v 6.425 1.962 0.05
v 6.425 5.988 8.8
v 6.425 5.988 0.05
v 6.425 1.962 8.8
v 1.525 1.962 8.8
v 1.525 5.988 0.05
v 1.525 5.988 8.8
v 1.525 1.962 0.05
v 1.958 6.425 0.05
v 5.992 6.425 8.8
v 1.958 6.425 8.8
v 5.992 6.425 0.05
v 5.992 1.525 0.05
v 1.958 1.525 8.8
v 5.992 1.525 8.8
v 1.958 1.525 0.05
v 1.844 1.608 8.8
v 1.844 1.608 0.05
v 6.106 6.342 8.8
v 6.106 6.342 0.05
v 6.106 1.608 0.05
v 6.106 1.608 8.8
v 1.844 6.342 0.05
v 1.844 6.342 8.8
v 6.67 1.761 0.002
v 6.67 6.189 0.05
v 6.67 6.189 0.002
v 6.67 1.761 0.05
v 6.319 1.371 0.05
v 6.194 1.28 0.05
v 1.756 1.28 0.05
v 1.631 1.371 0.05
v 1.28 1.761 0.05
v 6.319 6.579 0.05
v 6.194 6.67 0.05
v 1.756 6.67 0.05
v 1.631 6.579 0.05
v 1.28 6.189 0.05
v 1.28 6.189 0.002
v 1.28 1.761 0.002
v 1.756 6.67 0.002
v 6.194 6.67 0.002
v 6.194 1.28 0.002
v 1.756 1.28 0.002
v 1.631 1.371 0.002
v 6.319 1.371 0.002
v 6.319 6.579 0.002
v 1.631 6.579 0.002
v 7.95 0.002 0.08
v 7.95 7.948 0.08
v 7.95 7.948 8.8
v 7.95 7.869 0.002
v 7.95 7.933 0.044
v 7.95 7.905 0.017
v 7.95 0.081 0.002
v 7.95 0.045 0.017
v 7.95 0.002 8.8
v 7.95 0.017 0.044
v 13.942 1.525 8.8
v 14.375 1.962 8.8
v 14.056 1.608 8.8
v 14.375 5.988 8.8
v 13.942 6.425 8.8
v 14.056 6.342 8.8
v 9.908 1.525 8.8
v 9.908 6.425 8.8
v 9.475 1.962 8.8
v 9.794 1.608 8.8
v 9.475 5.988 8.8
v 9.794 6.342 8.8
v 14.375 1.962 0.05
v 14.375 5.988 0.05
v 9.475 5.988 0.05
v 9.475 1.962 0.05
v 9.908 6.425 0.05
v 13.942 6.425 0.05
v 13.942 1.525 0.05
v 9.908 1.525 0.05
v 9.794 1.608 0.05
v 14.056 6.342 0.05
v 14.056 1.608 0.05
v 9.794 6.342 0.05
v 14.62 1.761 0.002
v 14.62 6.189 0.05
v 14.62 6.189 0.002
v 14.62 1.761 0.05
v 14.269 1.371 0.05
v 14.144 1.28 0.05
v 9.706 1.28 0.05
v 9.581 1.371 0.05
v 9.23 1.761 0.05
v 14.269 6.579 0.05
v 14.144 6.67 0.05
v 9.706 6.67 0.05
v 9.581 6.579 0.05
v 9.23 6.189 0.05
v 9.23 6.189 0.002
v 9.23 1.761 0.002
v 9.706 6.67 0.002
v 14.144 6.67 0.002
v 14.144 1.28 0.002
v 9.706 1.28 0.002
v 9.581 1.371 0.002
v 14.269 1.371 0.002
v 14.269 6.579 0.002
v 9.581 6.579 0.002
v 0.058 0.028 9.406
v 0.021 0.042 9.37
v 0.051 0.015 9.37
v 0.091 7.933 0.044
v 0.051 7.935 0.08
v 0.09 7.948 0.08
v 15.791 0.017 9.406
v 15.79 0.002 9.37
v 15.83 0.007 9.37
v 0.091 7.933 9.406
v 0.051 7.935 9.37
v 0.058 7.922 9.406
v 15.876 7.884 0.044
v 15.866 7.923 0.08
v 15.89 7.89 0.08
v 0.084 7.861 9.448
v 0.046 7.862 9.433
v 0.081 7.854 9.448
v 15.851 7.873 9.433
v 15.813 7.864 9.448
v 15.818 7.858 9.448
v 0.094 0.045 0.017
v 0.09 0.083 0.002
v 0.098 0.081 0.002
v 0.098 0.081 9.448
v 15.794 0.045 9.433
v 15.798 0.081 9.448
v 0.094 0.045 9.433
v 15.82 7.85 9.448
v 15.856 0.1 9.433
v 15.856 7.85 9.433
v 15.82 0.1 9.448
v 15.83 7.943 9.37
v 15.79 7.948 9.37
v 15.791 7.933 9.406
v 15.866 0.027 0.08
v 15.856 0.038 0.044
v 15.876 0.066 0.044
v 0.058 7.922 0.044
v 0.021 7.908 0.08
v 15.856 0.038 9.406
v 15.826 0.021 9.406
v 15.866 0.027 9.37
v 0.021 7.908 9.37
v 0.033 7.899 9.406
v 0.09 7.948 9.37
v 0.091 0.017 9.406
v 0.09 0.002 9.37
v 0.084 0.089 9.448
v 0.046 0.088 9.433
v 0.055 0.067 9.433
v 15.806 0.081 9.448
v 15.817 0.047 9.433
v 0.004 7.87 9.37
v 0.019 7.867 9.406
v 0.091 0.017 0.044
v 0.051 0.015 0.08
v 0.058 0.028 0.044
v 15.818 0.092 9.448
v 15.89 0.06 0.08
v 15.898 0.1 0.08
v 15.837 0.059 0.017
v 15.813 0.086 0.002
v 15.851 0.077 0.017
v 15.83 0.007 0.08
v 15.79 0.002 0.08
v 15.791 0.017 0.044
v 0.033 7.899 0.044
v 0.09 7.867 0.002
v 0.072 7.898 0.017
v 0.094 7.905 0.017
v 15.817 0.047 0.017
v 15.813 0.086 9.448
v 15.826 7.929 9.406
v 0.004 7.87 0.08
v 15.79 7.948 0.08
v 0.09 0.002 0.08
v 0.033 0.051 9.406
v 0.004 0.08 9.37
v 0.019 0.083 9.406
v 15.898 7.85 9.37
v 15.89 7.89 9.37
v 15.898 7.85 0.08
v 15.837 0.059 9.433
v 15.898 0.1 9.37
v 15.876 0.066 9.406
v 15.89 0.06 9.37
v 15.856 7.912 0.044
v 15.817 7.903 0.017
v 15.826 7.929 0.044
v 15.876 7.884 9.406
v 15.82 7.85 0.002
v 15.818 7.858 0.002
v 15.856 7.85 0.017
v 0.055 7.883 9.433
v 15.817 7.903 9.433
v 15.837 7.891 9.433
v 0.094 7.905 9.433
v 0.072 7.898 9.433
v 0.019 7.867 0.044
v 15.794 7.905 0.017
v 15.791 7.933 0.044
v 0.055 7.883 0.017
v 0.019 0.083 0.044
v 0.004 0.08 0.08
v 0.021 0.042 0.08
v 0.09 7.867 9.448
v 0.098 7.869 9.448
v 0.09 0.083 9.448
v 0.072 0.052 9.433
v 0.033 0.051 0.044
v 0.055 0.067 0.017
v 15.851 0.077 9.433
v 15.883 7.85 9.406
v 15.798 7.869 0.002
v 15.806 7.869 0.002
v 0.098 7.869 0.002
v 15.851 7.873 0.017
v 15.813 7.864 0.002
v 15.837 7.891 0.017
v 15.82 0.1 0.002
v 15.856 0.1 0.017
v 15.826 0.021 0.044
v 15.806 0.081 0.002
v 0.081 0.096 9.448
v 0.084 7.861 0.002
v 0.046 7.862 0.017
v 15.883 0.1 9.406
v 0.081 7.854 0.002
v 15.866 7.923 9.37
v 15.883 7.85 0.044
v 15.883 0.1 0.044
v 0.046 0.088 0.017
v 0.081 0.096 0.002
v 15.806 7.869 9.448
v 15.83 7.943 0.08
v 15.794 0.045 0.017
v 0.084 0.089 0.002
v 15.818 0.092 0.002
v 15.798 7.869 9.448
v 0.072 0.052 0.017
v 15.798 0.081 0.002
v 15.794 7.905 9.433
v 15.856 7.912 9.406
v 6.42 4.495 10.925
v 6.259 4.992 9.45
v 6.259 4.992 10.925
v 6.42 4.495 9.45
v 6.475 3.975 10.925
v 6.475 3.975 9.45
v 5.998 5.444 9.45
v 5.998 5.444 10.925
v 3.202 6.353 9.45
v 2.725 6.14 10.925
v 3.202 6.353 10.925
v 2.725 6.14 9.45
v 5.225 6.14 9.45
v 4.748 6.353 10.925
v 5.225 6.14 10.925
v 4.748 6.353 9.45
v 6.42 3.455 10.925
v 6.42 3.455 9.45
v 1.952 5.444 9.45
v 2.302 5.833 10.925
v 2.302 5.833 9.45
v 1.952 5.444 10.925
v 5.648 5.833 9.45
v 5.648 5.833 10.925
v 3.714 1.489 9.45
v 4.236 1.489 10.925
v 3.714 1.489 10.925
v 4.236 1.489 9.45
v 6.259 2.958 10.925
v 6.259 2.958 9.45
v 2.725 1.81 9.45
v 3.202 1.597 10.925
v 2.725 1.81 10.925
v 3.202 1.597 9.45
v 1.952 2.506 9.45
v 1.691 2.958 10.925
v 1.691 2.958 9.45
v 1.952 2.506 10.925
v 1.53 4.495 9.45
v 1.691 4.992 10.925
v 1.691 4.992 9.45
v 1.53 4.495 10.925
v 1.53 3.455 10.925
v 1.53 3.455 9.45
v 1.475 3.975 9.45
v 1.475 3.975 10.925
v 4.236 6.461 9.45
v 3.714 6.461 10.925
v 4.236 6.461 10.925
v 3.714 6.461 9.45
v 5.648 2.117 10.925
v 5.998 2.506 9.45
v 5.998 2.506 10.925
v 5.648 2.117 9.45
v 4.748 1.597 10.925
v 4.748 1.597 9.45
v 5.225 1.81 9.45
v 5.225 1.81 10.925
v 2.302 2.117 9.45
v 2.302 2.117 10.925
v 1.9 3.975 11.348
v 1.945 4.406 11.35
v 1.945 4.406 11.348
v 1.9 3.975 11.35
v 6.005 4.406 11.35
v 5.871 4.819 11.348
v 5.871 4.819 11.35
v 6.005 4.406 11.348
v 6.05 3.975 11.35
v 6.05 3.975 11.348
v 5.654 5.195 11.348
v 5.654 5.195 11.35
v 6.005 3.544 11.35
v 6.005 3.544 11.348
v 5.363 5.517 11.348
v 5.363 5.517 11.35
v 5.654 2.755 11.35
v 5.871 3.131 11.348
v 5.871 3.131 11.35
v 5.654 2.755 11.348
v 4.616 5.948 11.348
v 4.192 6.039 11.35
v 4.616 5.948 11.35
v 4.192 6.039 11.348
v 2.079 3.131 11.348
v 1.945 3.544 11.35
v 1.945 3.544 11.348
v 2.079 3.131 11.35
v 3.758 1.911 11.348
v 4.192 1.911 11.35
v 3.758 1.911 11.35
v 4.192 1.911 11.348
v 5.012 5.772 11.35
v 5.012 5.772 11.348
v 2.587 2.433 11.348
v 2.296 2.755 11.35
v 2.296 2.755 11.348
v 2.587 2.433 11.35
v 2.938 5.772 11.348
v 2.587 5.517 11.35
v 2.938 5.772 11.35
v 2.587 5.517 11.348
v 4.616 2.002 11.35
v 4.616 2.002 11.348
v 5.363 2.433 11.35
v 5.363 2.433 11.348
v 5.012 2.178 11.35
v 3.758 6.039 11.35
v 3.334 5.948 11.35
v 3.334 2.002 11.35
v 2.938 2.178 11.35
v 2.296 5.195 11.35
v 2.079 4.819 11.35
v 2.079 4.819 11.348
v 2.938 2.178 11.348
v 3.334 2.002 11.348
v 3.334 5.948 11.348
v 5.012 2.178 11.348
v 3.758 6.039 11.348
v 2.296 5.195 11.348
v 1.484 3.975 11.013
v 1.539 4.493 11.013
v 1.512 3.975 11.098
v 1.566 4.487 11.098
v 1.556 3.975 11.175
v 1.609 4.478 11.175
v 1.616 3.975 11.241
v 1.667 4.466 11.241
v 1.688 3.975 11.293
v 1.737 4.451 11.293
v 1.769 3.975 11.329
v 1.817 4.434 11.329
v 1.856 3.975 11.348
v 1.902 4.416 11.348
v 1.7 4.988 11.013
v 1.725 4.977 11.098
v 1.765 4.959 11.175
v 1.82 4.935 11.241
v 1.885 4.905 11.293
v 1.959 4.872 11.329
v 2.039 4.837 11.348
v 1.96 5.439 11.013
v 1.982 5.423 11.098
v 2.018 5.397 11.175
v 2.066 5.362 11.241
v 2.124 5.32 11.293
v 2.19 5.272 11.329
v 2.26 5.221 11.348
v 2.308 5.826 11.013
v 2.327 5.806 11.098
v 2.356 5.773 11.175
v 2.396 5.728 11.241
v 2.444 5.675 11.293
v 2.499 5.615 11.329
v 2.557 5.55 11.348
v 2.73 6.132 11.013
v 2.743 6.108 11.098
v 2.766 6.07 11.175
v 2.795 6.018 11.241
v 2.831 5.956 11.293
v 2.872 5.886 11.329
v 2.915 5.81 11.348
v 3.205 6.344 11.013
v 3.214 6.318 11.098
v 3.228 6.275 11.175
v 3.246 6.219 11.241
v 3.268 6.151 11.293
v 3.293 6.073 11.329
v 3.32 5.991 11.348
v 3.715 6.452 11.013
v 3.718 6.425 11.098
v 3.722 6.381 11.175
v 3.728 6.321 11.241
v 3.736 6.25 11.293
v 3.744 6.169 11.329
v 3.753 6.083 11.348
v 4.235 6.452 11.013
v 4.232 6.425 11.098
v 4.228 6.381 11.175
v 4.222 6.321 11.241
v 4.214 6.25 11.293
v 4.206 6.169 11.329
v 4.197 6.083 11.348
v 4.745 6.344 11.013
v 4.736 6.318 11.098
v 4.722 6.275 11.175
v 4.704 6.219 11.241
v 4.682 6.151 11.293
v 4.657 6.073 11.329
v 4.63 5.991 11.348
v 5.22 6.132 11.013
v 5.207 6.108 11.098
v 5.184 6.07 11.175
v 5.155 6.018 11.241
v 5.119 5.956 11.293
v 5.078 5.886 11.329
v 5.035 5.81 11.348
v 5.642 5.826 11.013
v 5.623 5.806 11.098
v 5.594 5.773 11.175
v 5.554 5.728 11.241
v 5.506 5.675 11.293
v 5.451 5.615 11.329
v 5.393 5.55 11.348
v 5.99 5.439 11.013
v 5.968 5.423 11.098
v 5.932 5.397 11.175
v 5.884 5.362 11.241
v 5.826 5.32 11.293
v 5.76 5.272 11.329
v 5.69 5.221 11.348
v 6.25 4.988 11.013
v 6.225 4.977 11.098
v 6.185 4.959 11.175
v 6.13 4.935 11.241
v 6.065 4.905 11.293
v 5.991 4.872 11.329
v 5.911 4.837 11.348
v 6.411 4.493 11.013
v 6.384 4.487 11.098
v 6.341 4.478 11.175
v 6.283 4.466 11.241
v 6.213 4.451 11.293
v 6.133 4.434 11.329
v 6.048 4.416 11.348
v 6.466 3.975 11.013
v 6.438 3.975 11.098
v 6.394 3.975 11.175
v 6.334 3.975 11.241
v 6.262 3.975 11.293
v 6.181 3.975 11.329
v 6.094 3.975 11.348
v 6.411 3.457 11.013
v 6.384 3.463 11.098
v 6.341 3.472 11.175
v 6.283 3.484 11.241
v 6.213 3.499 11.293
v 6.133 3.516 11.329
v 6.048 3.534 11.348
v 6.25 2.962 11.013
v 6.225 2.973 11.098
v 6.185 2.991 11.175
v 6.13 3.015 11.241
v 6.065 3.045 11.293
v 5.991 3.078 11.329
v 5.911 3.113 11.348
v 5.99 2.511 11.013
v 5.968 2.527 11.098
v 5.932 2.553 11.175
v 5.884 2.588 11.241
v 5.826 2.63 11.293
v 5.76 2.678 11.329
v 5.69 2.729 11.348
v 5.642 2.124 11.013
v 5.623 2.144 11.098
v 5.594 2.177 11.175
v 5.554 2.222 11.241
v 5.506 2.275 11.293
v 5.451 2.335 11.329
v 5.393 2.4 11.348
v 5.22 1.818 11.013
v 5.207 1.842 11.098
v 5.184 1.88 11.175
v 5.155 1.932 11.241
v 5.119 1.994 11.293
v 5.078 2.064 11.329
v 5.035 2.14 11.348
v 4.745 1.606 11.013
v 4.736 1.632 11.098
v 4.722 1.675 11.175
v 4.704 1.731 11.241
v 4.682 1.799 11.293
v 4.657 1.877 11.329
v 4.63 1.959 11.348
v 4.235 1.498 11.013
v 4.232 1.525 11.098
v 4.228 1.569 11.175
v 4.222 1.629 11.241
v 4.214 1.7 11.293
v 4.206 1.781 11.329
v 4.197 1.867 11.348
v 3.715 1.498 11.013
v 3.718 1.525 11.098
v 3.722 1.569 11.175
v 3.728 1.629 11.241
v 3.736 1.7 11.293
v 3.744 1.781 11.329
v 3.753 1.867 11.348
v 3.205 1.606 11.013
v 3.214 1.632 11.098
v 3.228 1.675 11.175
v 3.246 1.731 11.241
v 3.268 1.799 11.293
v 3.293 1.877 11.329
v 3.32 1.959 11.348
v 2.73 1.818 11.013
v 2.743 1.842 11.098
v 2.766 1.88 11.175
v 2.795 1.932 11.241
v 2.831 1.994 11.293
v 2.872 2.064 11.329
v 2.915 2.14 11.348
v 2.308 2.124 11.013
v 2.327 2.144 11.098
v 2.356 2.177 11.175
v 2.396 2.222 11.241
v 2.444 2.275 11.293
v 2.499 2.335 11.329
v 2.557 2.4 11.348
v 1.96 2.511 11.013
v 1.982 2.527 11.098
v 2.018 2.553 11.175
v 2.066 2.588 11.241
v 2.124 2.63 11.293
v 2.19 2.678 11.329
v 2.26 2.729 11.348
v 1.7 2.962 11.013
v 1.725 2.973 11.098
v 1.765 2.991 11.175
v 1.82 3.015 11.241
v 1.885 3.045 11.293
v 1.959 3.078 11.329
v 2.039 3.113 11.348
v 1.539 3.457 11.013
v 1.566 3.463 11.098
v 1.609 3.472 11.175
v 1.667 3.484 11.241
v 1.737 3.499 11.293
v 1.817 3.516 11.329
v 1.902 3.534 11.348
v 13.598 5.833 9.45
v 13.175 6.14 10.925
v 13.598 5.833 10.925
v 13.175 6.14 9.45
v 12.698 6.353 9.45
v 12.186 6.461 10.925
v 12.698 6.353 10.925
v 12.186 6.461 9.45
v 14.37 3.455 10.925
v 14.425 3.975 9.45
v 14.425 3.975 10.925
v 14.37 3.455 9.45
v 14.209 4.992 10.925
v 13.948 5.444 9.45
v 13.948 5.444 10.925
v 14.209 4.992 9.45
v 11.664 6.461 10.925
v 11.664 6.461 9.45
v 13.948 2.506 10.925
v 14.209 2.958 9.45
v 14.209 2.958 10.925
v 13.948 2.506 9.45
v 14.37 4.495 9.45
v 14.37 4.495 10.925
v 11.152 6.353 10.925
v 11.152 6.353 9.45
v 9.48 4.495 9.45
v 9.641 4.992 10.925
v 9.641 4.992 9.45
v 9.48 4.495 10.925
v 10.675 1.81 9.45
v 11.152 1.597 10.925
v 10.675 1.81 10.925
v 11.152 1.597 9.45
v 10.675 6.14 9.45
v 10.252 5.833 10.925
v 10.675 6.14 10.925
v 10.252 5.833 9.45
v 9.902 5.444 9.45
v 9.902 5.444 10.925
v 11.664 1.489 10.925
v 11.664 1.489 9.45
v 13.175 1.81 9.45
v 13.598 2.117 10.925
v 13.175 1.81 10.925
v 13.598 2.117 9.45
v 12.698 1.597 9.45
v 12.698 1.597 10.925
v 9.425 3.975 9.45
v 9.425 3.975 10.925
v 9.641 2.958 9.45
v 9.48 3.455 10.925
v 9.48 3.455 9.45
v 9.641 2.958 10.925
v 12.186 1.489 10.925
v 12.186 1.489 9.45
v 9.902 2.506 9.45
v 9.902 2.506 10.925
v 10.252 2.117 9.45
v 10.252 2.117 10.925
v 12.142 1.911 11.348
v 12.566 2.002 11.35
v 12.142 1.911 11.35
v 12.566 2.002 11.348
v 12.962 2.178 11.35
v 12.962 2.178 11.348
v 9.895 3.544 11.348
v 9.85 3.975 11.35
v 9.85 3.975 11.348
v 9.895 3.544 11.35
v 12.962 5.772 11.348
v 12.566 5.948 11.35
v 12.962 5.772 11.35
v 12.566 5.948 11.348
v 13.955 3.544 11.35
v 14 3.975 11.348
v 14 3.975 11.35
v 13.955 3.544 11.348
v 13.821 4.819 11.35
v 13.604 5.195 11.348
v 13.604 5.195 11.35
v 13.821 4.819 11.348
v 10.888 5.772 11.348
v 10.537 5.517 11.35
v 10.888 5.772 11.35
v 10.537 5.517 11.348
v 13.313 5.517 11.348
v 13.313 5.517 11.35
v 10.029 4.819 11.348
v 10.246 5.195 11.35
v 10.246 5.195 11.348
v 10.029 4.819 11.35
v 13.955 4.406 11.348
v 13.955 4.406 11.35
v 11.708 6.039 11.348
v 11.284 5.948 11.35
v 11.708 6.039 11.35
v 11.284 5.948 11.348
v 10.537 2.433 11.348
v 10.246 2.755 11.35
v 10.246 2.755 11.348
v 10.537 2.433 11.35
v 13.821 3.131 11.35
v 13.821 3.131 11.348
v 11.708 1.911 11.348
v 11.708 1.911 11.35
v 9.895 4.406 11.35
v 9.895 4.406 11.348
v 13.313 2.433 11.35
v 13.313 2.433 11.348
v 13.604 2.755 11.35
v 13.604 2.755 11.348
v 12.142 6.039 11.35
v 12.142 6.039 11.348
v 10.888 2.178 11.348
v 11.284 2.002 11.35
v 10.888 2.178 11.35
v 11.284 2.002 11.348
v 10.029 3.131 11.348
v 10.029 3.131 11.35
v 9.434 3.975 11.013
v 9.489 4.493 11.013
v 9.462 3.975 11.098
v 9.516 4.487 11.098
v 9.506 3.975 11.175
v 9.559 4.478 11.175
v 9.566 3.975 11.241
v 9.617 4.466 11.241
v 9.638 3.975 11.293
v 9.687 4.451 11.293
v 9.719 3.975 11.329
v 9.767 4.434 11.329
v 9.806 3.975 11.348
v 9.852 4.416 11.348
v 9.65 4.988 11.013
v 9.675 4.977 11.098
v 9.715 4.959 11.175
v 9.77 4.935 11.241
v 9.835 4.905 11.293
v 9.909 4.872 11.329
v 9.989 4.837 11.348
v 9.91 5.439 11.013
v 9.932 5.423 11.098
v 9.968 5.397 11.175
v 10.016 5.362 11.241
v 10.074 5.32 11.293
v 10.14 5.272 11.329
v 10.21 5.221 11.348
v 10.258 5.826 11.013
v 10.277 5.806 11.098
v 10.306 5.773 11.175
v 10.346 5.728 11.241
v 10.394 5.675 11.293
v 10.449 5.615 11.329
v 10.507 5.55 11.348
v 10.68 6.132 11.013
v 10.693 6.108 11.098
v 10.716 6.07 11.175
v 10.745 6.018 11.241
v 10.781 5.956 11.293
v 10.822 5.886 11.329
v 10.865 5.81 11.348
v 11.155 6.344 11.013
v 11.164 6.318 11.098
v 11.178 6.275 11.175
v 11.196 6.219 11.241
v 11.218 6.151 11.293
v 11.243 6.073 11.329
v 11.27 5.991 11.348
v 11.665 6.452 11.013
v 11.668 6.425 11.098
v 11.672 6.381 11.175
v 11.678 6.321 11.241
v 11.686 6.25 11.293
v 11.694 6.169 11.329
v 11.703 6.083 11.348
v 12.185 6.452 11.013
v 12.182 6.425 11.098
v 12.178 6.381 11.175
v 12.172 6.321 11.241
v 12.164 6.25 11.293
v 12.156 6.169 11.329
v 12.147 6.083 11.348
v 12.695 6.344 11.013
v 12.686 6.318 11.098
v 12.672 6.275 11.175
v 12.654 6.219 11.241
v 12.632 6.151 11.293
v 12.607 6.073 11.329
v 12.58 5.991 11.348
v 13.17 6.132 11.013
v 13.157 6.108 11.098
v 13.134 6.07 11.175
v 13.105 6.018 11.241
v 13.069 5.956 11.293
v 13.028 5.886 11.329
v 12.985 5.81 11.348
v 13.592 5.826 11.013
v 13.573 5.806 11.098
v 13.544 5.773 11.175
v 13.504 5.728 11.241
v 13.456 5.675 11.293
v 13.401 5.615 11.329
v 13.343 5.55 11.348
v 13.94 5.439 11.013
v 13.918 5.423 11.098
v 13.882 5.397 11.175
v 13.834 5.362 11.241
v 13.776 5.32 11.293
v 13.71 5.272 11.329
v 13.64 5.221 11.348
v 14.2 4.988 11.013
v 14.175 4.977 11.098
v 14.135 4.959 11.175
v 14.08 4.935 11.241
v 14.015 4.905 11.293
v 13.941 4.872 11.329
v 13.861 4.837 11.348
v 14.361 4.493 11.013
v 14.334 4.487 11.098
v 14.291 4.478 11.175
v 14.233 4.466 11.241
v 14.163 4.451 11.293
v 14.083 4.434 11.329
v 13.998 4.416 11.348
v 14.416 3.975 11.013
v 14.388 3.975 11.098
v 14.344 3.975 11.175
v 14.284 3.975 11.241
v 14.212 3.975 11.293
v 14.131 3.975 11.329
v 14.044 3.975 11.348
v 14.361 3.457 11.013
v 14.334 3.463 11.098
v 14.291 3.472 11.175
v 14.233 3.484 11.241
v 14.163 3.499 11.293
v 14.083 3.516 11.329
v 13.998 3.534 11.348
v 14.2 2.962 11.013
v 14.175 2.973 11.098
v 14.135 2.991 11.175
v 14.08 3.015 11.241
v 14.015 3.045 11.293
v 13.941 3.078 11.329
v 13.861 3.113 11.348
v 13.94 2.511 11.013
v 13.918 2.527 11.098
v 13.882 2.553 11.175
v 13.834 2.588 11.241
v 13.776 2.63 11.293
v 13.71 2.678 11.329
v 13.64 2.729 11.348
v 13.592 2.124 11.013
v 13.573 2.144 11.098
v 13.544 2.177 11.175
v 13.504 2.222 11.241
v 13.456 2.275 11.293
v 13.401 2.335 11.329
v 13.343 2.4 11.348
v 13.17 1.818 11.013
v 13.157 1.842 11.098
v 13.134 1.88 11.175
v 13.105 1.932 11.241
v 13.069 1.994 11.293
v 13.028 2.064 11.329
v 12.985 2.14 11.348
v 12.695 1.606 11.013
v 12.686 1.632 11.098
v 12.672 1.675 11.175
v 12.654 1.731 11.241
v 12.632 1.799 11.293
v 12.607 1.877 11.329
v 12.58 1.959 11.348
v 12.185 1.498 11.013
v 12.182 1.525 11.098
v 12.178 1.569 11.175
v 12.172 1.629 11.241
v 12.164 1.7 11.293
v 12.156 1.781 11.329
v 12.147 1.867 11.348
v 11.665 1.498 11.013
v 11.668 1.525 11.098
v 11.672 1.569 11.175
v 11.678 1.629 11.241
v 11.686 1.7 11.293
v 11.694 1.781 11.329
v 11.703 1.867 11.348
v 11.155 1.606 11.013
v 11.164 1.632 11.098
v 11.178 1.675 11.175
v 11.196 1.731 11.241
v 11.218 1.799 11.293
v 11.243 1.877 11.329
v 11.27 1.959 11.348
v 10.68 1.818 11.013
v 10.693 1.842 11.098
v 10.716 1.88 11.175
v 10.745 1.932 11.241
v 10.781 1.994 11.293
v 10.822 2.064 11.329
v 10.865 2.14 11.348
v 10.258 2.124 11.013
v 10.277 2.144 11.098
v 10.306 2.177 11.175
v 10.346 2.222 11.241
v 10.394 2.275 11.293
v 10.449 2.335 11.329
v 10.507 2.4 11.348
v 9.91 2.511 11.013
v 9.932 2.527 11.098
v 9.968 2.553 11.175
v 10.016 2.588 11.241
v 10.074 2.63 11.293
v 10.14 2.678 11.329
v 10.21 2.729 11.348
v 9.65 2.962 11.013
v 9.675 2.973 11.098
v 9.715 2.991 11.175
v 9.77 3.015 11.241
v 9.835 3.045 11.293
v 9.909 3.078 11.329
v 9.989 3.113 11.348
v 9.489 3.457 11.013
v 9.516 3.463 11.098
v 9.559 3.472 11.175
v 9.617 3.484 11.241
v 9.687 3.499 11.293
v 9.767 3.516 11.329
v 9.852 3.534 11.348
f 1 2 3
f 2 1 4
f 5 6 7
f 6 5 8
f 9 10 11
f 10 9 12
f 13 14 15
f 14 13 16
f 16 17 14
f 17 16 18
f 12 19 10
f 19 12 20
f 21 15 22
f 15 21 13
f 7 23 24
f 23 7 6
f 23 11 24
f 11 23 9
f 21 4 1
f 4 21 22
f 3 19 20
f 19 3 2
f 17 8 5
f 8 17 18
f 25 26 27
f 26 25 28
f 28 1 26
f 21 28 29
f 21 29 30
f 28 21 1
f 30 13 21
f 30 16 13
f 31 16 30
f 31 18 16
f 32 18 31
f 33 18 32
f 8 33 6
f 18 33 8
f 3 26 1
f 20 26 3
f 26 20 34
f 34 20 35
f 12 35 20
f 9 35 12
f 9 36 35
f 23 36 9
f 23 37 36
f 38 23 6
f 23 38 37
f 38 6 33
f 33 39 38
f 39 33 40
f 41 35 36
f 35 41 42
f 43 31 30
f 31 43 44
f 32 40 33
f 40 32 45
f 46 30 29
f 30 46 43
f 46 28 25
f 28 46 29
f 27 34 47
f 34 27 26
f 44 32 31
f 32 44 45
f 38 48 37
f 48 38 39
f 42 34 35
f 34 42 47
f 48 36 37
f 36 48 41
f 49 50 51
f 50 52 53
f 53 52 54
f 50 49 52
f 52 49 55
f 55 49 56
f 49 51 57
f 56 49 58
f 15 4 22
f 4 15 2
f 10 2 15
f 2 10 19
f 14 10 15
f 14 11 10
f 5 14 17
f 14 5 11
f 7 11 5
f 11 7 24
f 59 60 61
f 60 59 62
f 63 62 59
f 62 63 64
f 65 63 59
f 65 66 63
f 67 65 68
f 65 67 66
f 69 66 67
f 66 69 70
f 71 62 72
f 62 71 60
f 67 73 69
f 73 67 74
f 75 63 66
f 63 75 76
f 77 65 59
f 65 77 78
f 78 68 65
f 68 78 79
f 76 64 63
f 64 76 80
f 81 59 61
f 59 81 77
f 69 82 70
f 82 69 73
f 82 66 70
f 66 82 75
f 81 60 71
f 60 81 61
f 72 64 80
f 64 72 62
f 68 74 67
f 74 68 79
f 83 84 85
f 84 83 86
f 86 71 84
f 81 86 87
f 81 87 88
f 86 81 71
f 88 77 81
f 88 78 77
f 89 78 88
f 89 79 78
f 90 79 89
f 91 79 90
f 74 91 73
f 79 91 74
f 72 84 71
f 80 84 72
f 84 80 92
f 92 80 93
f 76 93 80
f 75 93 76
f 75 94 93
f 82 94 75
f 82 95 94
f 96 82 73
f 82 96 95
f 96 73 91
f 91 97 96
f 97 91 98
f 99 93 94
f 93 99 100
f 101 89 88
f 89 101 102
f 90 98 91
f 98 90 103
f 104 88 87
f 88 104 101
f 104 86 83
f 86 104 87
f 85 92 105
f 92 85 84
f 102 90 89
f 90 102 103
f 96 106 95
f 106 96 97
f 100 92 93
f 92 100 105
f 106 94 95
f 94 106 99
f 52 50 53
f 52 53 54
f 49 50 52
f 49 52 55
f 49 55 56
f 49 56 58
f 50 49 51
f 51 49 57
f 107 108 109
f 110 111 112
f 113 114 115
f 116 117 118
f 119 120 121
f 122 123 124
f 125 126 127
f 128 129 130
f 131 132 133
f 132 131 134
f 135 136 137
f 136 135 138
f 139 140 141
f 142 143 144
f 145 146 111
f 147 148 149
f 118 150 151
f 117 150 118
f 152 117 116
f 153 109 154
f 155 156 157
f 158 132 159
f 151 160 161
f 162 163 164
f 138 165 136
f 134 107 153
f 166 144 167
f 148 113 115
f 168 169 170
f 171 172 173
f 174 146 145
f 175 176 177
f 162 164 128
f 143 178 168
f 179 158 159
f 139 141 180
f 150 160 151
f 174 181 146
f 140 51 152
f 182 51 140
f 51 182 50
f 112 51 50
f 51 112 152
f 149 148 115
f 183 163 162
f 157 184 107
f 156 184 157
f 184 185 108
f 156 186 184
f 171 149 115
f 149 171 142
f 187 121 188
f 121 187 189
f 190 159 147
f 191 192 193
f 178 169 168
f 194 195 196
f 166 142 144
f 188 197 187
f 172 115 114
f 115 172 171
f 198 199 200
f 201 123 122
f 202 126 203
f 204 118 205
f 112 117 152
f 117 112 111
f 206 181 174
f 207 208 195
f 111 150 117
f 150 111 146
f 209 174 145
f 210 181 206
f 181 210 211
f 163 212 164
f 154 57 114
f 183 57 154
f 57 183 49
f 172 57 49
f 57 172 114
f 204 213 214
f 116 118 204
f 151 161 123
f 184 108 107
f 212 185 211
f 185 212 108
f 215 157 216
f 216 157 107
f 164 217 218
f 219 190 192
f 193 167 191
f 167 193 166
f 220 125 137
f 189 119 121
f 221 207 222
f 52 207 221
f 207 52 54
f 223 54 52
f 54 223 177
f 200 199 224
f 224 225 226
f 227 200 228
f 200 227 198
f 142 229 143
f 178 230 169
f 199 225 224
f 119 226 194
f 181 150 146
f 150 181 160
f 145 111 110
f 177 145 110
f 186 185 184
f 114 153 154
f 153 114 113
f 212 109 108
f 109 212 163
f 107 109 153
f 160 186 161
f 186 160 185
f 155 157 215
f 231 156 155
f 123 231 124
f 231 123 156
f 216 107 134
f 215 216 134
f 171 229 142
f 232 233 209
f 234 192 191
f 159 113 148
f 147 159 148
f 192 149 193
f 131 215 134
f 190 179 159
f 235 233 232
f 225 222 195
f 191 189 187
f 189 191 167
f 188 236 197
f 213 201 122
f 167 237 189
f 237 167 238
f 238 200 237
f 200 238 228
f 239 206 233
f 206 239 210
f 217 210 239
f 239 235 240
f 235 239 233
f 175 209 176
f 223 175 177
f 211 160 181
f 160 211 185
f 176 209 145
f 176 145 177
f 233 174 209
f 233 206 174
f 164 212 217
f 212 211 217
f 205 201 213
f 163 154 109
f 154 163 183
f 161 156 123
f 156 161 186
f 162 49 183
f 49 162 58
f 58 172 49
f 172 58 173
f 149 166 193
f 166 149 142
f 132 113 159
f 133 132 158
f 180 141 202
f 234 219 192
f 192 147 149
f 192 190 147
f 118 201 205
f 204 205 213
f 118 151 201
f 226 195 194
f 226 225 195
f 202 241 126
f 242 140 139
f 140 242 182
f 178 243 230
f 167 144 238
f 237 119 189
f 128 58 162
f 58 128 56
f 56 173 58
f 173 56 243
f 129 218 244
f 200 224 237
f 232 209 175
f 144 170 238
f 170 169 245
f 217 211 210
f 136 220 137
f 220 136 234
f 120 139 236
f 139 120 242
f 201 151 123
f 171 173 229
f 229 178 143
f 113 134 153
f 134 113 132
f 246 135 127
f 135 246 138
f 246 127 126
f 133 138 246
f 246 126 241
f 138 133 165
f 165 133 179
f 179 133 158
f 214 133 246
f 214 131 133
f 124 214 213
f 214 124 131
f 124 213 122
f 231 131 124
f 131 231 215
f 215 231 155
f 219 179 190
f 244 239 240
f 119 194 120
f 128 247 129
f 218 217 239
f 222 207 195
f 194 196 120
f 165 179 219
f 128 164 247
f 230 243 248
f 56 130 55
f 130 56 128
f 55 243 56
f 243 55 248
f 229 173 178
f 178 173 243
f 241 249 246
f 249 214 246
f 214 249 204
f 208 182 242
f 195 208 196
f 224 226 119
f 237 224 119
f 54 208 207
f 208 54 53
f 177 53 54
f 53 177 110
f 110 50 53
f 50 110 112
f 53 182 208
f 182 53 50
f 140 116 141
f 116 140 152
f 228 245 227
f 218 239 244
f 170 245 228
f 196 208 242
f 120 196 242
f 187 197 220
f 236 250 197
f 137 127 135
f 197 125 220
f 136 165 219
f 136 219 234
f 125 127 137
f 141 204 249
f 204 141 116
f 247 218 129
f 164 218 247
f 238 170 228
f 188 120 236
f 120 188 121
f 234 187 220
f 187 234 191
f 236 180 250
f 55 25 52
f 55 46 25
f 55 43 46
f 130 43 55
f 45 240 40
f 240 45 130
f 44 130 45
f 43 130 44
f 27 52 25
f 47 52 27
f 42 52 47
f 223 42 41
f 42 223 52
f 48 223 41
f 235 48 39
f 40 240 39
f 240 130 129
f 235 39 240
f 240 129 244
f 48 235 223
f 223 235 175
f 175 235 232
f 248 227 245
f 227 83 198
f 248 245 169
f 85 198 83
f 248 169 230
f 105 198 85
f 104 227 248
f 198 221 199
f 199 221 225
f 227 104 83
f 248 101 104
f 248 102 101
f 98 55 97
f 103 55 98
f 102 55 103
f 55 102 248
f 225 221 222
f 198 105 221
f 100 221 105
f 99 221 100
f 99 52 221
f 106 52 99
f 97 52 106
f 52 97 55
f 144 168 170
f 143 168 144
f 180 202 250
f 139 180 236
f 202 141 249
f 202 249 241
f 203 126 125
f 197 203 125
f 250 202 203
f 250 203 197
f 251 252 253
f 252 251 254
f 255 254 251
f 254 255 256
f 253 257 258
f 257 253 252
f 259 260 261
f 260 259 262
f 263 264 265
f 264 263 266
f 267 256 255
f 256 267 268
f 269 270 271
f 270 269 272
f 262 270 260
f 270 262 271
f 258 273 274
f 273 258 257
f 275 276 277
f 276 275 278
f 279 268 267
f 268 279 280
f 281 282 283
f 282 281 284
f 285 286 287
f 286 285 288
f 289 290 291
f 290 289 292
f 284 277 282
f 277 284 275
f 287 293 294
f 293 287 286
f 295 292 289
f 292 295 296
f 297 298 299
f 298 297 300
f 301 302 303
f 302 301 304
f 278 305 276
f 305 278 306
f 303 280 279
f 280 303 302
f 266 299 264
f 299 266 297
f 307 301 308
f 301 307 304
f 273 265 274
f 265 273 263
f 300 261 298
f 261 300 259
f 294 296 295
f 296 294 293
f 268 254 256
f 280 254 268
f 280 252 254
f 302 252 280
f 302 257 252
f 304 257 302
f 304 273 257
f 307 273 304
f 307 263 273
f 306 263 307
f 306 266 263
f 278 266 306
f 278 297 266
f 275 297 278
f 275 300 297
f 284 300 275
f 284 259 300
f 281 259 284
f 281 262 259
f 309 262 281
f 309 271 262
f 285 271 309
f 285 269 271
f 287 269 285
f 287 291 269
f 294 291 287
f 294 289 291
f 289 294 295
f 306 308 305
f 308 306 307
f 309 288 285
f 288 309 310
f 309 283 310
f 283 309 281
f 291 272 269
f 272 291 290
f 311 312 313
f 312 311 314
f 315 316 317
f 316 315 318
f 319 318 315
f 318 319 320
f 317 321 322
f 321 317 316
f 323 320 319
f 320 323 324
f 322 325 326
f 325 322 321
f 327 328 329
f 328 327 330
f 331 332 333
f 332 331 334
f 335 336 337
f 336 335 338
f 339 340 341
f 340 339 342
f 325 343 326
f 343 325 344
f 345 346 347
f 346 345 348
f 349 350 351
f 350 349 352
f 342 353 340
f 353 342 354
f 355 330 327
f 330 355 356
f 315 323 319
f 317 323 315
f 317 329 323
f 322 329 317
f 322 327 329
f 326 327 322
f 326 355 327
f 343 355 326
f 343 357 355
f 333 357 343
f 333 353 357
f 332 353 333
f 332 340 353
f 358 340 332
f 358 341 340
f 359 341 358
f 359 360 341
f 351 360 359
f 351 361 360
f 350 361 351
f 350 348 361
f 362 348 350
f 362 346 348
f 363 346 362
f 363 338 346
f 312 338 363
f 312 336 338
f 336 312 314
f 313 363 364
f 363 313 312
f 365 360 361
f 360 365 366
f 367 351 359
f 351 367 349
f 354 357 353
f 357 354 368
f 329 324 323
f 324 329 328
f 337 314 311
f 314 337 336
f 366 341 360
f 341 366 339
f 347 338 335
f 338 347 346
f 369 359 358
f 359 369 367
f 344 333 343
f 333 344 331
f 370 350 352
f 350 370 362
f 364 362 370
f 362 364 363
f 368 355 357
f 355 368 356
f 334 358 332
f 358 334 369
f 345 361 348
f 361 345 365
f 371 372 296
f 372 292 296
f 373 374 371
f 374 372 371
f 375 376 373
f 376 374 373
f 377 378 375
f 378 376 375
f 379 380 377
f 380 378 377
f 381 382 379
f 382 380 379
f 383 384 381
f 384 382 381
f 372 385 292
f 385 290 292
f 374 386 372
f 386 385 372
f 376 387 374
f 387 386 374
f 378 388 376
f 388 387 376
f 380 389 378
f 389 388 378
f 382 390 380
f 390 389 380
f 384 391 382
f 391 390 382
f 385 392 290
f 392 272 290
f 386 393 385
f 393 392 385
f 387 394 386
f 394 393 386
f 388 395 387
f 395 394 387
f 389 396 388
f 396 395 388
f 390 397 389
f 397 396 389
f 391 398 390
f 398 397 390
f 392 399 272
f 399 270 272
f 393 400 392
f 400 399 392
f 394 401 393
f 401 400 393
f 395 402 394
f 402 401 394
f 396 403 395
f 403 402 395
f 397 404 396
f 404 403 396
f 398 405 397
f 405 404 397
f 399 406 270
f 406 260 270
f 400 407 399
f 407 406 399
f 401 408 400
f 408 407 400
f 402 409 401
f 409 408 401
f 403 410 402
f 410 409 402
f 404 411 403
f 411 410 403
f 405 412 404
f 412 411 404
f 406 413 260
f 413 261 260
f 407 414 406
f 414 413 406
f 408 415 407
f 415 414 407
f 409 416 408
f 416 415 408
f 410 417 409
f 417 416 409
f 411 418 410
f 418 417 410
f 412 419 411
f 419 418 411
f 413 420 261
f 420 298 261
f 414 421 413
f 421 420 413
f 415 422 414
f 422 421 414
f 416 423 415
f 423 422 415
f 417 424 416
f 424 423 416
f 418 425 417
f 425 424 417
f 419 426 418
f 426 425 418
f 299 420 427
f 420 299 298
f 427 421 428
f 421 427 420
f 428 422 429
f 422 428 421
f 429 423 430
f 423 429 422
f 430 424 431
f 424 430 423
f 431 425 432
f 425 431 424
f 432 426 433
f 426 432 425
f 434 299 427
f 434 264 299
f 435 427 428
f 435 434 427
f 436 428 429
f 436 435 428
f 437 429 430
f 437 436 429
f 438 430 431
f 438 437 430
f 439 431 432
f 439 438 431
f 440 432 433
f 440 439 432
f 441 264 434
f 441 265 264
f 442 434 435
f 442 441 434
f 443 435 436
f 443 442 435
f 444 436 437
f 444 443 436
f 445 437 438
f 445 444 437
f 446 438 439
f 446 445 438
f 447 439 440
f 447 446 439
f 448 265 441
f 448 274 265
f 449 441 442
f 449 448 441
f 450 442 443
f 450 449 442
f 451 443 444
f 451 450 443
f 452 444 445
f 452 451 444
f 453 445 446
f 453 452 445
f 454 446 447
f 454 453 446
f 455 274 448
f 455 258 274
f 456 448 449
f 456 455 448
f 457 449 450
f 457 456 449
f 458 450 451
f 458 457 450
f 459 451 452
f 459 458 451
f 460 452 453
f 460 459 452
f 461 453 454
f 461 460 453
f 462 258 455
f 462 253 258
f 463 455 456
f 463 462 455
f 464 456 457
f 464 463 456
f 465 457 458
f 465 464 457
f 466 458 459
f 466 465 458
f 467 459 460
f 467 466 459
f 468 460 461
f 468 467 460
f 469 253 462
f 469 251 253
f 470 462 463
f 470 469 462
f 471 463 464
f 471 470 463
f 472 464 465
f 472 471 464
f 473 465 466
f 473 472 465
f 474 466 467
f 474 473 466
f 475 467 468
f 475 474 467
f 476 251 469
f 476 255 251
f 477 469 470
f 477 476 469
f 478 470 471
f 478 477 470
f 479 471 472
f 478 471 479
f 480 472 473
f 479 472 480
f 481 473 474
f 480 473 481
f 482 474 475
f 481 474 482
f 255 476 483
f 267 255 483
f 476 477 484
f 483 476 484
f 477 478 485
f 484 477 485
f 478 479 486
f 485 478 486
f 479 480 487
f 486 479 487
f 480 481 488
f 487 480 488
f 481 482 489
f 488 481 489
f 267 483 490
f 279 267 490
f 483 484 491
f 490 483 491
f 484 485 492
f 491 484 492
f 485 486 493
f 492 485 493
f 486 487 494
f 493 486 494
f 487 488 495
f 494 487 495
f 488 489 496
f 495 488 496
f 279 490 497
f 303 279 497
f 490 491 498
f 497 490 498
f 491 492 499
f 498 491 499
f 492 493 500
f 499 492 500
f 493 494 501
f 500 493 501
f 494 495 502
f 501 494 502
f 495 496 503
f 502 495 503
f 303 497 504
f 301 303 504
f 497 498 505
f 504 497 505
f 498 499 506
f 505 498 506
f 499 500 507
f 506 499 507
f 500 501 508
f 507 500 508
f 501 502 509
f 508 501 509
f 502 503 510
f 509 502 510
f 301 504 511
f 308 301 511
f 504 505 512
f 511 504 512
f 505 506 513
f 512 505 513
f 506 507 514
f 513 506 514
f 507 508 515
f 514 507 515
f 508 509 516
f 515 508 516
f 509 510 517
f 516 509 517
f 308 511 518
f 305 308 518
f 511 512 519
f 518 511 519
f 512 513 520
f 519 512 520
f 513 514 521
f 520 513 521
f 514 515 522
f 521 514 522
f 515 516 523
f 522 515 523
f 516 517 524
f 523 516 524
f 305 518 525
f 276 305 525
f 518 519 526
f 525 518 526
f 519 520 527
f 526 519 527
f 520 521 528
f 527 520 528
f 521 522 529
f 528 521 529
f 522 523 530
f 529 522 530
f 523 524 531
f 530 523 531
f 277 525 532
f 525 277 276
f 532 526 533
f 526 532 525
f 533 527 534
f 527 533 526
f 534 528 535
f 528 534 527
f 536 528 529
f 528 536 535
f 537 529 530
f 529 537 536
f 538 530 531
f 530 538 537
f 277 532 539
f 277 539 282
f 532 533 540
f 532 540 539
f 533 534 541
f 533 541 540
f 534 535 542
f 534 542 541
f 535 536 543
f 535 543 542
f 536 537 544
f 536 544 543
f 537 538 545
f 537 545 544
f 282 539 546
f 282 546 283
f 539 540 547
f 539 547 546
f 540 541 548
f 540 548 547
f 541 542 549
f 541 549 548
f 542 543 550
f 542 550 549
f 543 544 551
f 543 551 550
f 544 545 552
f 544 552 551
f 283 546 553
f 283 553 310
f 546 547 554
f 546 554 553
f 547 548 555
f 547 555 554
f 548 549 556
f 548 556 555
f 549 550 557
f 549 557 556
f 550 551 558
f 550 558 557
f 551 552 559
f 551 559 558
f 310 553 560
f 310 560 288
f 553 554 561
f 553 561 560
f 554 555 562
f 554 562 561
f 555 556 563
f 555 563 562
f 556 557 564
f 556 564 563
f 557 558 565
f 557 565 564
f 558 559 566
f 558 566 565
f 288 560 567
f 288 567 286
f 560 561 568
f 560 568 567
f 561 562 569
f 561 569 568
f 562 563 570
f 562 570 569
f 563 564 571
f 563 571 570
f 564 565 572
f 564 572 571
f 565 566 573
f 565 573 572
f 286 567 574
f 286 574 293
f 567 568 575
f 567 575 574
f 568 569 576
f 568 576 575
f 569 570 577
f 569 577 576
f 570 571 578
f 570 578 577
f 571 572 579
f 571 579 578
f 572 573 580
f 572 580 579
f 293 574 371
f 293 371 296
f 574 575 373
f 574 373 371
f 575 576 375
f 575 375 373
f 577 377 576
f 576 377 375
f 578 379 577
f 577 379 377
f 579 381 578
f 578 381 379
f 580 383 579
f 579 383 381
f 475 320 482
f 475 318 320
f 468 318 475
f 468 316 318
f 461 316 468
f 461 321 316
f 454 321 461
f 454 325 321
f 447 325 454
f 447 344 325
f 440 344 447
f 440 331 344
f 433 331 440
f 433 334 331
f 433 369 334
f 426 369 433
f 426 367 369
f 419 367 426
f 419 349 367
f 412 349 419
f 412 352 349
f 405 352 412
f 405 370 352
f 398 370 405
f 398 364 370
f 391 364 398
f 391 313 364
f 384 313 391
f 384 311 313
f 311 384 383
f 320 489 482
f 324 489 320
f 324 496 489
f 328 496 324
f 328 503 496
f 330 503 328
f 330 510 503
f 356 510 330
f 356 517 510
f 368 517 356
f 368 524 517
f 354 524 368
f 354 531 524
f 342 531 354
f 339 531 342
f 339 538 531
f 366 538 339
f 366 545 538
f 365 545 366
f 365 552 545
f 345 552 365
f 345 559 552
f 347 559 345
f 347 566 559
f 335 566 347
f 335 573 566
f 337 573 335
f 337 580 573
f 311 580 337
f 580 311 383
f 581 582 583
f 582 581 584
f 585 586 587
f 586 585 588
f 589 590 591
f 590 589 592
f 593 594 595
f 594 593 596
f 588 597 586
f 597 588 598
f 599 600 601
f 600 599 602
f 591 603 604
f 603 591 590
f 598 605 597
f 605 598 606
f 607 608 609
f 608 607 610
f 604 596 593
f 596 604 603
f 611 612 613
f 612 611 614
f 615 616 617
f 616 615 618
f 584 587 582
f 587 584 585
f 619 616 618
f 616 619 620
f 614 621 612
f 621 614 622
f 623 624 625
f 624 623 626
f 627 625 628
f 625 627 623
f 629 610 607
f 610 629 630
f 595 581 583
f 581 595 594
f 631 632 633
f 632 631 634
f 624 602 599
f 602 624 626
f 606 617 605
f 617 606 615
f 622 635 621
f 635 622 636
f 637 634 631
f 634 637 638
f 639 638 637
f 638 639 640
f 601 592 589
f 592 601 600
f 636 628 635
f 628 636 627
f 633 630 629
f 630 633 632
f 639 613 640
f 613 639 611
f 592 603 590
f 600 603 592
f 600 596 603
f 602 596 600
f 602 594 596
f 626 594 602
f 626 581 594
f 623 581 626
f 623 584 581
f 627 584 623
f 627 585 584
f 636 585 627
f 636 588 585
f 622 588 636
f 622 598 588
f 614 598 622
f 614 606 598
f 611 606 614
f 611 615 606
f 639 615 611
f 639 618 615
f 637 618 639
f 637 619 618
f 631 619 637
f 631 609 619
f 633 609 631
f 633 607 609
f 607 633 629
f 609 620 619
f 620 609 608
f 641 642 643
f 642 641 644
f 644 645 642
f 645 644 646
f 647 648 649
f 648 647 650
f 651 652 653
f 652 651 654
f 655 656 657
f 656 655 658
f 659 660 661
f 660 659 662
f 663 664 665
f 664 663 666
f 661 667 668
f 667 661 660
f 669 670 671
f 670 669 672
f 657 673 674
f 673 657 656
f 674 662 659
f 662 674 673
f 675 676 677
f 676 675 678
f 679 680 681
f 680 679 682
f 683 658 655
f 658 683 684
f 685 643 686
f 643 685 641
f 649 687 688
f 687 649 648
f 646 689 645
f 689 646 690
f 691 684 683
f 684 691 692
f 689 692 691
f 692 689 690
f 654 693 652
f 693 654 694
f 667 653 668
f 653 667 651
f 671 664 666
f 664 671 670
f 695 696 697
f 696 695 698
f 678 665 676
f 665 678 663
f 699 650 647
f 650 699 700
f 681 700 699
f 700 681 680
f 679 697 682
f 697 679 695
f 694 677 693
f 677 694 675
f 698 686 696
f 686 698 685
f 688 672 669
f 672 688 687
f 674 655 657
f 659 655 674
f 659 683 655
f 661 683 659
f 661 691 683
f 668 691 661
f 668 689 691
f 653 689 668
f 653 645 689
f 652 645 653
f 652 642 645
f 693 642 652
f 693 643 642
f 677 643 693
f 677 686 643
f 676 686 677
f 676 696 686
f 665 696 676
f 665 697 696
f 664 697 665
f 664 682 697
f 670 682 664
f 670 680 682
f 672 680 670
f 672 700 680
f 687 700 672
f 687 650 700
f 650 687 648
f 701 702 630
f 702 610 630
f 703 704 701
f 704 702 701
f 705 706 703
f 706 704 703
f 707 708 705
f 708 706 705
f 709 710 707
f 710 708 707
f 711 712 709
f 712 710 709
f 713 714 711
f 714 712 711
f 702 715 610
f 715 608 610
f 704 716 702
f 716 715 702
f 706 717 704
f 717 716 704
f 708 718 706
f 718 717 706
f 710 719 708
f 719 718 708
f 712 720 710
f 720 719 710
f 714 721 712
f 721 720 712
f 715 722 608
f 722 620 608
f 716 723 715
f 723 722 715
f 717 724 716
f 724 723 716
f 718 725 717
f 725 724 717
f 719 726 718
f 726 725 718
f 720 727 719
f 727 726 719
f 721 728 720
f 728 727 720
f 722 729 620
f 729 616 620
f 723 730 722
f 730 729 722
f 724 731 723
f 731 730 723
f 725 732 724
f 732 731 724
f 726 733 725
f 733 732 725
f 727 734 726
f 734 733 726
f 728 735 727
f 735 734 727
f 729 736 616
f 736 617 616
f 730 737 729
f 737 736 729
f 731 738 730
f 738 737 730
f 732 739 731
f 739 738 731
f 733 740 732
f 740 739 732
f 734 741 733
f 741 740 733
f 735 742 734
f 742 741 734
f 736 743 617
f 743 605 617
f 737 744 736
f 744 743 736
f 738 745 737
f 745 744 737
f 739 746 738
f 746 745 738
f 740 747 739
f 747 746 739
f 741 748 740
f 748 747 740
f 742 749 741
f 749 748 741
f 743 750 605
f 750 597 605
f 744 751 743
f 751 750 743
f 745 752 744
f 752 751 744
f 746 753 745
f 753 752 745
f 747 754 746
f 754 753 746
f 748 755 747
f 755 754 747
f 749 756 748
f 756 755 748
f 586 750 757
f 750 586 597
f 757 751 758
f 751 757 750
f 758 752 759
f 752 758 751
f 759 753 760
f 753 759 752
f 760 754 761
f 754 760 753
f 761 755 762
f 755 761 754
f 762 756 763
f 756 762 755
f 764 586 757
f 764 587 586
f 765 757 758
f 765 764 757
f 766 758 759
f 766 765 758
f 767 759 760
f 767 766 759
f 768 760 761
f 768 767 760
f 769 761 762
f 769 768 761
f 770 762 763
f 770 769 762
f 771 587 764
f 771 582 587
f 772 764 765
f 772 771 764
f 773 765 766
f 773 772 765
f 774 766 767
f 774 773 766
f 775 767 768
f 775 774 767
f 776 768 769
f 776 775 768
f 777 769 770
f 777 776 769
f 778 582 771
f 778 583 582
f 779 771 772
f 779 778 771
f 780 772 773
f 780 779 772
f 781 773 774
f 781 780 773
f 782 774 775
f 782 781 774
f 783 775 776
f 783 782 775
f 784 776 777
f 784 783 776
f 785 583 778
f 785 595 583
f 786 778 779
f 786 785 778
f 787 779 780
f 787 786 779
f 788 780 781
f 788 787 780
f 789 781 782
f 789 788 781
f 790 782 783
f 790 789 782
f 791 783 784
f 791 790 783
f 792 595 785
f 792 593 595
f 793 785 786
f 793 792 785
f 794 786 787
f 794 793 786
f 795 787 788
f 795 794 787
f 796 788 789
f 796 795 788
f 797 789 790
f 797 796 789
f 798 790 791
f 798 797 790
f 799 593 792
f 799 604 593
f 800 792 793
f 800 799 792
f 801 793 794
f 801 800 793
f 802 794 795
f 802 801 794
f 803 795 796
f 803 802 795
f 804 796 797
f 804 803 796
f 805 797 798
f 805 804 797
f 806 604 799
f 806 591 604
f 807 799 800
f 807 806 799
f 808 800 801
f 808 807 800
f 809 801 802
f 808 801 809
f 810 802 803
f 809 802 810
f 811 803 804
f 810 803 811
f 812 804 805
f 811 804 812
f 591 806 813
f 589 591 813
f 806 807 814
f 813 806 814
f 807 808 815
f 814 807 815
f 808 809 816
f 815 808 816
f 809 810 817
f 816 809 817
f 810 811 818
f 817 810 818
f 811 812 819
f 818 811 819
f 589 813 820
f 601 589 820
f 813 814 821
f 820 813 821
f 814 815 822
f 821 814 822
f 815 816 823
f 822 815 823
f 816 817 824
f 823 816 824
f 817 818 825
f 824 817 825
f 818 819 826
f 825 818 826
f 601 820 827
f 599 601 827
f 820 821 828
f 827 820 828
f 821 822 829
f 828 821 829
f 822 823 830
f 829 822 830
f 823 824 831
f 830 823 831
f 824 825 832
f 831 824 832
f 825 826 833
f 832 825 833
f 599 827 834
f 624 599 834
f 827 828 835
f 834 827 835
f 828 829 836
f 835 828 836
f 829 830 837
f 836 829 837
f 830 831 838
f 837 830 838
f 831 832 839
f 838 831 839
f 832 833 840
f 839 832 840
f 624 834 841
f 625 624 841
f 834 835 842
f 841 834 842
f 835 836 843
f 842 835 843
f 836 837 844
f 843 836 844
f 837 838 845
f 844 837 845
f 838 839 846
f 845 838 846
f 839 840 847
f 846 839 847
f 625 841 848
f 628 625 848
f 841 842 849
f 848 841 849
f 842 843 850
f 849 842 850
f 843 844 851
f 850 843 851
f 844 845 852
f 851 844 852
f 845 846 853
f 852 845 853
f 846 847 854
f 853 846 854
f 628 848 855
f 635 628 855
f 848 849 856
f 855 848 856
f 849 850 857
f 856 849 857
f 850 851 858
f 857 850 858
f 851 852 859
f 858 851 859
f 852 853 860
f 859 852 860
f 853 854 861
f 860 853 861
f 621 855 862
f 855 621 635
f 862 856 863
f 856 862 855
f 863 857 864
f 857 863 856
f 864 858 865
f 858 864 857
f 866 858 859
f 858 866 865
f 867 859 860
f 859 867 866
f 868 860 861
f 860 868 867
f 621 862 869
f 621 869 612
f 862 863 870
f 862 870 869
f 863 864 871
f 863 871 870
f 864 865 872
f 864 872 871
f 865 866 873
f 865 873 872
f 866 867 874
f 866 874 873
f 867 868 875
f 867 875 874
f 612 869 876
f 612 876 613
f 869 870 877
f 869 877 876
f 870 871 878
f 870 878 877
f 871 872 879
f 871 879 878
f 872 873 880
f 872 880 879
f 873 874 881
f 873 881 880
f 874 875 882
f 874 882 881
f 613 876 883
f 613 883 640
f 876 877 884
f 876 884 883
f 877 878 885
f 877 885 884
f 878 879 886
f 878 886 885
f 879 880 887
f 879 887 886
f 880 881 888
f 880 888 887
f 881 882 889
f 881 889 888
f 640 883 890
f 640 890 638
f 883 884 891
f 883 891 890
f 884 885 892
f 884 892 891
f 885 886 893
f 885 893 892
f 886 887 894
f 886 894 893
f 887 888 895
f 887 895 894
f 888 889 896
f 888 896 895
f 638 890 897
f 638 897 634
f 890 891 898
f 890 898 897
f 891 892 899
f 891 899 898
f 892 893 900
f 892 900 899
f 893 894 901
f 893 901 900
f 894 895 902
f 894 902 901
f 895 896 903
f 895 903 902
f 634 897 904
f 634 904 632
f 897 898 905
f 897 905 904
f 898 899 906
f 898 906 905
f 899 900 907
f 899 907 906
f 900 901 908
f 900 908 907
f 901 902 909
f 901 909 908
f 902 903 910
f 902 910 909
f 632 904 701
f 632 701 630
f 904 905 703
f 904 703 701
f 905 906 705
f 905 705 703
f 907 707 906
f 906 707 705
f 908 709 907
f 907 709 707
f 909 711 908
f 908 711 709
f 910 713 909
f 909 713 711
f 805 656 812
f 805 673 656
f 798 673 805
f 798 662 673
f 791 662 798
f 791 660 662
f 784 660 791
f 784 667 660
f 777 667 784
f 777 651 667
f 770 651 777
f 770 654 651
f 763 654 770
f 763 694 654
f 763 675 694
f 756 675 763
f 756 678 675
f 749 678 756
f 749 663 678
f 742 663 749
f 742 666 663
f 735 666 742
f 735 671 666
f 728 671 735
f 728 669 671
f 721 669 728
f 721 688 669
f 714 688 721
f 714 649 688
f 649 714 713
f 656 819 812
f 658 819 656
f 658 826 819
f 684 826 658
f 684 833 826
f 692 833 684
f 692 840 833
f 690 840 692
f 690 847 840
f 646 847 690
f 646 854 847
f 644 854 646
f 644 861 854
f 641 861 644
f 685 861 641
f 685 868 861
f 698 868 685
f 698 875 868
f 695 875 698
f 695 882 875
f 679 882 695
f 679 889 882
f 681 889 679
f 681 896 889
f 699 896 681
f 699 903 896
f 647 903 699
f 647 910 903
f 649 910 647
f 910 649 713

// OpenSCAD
// file: ../lib/roundedcube_simple.scad
module roundedcube_simple(size = [1, 1, 1], center = false, radius = 0.5, resolution = 20) {
	// If single value, convert to [x, y, z] vector
	size = (size[0] == undef) ? [size, size, size] : size;

	translate = (center == false) ?
		[radius, radius, radius] :
		[
			radius - (size[0] / 2),
			radius - (size[1] / 2),
			radius - (size[2] / 2)
	];

	translate(v = translate)
	minkowski() {
		cube(size = [
			size[0] - (radius * 2),
			size[1] - (radius * 2),
			size[2] - (radius * 2)
		]);
		sphere(r = radius, $fn = resolution);
	}
}
// file: ../lib/roundedcube.scad
// More information: https://danielupshaw.com/openscad-rounded-corners/

// Set to 0.01 for higher definition curves (renders slower)
$fs = 0.15;

module roundedcube(size = [1, 1, 1], center = false, radius = 0.5, apply_to = "all", resolution = 20) {
	// If single value, convert to [x, y, z] vector
	size = (size[0] == undef) ? [size, size, size] : size;

	translate_min = radius;
	translate_xmax = size[0] - radius;
	translate_ymax = size[1] - radius;
	translate_zmax = size[2] - radius;

	diameter = radius * 2;

	obj_translate = (center == false) ?
		[0, 0, 0] : [
			-(size[0] / 2),
			-(size[1] / 2),
			-(size[2] / 2)
		];

	translate(v = obj_translate) {
		hull() {
			for (translate_x = [translate_min, translate_xmax]) {
				x_at = (translate_x == translate_min) ? "min" : "max";
				for (translate_y = [translate_min, translate_ymax]) {
					y_at = (translate_y == translate_min) ? "min" : "max";
					for (translate_z = [translate_min, translate_zmax]) {
						z_at = (translate_z == translate_min) ? "min" : "max";

						translate(v = [translate_x, translate_y, translate_z])
						if (
							(apply_to == "all") ||
							(apply_to == "xmin" && x_at == "min") || (apply_to == "xmax" && x_at == "max") ||
							(apply_to == "ymin" && y_at == "min") || (apply_to == "ymax" && y_at == "max") ||
							(apply_to == "zmin" && z_at == "min") || (apply_to == "zmax" && z_at == "max")
						) {
							sphere(r = radius, $fn = resolution);
						} else {
							rotate = 
								(apply_to == "xmin" || apply_to == "xmax" || apply_to == "x") ? [0, 90, 0] : (
								(apply_to == "ymin" || apply_to == "ymax" || apply_to == "y") ? [90, 90, 0] :
								[0, 0, 0]
							);
							rotate(a = rotate)
							cylinder(h = diameter, r = radius, center = true, $fn = resolution);
						}
					}
				}
			}
		}
	}
}
// main file
echo(version=version());

include <../lib/block.scad>;

block(baseLayers=3, grid=[2,1]);
